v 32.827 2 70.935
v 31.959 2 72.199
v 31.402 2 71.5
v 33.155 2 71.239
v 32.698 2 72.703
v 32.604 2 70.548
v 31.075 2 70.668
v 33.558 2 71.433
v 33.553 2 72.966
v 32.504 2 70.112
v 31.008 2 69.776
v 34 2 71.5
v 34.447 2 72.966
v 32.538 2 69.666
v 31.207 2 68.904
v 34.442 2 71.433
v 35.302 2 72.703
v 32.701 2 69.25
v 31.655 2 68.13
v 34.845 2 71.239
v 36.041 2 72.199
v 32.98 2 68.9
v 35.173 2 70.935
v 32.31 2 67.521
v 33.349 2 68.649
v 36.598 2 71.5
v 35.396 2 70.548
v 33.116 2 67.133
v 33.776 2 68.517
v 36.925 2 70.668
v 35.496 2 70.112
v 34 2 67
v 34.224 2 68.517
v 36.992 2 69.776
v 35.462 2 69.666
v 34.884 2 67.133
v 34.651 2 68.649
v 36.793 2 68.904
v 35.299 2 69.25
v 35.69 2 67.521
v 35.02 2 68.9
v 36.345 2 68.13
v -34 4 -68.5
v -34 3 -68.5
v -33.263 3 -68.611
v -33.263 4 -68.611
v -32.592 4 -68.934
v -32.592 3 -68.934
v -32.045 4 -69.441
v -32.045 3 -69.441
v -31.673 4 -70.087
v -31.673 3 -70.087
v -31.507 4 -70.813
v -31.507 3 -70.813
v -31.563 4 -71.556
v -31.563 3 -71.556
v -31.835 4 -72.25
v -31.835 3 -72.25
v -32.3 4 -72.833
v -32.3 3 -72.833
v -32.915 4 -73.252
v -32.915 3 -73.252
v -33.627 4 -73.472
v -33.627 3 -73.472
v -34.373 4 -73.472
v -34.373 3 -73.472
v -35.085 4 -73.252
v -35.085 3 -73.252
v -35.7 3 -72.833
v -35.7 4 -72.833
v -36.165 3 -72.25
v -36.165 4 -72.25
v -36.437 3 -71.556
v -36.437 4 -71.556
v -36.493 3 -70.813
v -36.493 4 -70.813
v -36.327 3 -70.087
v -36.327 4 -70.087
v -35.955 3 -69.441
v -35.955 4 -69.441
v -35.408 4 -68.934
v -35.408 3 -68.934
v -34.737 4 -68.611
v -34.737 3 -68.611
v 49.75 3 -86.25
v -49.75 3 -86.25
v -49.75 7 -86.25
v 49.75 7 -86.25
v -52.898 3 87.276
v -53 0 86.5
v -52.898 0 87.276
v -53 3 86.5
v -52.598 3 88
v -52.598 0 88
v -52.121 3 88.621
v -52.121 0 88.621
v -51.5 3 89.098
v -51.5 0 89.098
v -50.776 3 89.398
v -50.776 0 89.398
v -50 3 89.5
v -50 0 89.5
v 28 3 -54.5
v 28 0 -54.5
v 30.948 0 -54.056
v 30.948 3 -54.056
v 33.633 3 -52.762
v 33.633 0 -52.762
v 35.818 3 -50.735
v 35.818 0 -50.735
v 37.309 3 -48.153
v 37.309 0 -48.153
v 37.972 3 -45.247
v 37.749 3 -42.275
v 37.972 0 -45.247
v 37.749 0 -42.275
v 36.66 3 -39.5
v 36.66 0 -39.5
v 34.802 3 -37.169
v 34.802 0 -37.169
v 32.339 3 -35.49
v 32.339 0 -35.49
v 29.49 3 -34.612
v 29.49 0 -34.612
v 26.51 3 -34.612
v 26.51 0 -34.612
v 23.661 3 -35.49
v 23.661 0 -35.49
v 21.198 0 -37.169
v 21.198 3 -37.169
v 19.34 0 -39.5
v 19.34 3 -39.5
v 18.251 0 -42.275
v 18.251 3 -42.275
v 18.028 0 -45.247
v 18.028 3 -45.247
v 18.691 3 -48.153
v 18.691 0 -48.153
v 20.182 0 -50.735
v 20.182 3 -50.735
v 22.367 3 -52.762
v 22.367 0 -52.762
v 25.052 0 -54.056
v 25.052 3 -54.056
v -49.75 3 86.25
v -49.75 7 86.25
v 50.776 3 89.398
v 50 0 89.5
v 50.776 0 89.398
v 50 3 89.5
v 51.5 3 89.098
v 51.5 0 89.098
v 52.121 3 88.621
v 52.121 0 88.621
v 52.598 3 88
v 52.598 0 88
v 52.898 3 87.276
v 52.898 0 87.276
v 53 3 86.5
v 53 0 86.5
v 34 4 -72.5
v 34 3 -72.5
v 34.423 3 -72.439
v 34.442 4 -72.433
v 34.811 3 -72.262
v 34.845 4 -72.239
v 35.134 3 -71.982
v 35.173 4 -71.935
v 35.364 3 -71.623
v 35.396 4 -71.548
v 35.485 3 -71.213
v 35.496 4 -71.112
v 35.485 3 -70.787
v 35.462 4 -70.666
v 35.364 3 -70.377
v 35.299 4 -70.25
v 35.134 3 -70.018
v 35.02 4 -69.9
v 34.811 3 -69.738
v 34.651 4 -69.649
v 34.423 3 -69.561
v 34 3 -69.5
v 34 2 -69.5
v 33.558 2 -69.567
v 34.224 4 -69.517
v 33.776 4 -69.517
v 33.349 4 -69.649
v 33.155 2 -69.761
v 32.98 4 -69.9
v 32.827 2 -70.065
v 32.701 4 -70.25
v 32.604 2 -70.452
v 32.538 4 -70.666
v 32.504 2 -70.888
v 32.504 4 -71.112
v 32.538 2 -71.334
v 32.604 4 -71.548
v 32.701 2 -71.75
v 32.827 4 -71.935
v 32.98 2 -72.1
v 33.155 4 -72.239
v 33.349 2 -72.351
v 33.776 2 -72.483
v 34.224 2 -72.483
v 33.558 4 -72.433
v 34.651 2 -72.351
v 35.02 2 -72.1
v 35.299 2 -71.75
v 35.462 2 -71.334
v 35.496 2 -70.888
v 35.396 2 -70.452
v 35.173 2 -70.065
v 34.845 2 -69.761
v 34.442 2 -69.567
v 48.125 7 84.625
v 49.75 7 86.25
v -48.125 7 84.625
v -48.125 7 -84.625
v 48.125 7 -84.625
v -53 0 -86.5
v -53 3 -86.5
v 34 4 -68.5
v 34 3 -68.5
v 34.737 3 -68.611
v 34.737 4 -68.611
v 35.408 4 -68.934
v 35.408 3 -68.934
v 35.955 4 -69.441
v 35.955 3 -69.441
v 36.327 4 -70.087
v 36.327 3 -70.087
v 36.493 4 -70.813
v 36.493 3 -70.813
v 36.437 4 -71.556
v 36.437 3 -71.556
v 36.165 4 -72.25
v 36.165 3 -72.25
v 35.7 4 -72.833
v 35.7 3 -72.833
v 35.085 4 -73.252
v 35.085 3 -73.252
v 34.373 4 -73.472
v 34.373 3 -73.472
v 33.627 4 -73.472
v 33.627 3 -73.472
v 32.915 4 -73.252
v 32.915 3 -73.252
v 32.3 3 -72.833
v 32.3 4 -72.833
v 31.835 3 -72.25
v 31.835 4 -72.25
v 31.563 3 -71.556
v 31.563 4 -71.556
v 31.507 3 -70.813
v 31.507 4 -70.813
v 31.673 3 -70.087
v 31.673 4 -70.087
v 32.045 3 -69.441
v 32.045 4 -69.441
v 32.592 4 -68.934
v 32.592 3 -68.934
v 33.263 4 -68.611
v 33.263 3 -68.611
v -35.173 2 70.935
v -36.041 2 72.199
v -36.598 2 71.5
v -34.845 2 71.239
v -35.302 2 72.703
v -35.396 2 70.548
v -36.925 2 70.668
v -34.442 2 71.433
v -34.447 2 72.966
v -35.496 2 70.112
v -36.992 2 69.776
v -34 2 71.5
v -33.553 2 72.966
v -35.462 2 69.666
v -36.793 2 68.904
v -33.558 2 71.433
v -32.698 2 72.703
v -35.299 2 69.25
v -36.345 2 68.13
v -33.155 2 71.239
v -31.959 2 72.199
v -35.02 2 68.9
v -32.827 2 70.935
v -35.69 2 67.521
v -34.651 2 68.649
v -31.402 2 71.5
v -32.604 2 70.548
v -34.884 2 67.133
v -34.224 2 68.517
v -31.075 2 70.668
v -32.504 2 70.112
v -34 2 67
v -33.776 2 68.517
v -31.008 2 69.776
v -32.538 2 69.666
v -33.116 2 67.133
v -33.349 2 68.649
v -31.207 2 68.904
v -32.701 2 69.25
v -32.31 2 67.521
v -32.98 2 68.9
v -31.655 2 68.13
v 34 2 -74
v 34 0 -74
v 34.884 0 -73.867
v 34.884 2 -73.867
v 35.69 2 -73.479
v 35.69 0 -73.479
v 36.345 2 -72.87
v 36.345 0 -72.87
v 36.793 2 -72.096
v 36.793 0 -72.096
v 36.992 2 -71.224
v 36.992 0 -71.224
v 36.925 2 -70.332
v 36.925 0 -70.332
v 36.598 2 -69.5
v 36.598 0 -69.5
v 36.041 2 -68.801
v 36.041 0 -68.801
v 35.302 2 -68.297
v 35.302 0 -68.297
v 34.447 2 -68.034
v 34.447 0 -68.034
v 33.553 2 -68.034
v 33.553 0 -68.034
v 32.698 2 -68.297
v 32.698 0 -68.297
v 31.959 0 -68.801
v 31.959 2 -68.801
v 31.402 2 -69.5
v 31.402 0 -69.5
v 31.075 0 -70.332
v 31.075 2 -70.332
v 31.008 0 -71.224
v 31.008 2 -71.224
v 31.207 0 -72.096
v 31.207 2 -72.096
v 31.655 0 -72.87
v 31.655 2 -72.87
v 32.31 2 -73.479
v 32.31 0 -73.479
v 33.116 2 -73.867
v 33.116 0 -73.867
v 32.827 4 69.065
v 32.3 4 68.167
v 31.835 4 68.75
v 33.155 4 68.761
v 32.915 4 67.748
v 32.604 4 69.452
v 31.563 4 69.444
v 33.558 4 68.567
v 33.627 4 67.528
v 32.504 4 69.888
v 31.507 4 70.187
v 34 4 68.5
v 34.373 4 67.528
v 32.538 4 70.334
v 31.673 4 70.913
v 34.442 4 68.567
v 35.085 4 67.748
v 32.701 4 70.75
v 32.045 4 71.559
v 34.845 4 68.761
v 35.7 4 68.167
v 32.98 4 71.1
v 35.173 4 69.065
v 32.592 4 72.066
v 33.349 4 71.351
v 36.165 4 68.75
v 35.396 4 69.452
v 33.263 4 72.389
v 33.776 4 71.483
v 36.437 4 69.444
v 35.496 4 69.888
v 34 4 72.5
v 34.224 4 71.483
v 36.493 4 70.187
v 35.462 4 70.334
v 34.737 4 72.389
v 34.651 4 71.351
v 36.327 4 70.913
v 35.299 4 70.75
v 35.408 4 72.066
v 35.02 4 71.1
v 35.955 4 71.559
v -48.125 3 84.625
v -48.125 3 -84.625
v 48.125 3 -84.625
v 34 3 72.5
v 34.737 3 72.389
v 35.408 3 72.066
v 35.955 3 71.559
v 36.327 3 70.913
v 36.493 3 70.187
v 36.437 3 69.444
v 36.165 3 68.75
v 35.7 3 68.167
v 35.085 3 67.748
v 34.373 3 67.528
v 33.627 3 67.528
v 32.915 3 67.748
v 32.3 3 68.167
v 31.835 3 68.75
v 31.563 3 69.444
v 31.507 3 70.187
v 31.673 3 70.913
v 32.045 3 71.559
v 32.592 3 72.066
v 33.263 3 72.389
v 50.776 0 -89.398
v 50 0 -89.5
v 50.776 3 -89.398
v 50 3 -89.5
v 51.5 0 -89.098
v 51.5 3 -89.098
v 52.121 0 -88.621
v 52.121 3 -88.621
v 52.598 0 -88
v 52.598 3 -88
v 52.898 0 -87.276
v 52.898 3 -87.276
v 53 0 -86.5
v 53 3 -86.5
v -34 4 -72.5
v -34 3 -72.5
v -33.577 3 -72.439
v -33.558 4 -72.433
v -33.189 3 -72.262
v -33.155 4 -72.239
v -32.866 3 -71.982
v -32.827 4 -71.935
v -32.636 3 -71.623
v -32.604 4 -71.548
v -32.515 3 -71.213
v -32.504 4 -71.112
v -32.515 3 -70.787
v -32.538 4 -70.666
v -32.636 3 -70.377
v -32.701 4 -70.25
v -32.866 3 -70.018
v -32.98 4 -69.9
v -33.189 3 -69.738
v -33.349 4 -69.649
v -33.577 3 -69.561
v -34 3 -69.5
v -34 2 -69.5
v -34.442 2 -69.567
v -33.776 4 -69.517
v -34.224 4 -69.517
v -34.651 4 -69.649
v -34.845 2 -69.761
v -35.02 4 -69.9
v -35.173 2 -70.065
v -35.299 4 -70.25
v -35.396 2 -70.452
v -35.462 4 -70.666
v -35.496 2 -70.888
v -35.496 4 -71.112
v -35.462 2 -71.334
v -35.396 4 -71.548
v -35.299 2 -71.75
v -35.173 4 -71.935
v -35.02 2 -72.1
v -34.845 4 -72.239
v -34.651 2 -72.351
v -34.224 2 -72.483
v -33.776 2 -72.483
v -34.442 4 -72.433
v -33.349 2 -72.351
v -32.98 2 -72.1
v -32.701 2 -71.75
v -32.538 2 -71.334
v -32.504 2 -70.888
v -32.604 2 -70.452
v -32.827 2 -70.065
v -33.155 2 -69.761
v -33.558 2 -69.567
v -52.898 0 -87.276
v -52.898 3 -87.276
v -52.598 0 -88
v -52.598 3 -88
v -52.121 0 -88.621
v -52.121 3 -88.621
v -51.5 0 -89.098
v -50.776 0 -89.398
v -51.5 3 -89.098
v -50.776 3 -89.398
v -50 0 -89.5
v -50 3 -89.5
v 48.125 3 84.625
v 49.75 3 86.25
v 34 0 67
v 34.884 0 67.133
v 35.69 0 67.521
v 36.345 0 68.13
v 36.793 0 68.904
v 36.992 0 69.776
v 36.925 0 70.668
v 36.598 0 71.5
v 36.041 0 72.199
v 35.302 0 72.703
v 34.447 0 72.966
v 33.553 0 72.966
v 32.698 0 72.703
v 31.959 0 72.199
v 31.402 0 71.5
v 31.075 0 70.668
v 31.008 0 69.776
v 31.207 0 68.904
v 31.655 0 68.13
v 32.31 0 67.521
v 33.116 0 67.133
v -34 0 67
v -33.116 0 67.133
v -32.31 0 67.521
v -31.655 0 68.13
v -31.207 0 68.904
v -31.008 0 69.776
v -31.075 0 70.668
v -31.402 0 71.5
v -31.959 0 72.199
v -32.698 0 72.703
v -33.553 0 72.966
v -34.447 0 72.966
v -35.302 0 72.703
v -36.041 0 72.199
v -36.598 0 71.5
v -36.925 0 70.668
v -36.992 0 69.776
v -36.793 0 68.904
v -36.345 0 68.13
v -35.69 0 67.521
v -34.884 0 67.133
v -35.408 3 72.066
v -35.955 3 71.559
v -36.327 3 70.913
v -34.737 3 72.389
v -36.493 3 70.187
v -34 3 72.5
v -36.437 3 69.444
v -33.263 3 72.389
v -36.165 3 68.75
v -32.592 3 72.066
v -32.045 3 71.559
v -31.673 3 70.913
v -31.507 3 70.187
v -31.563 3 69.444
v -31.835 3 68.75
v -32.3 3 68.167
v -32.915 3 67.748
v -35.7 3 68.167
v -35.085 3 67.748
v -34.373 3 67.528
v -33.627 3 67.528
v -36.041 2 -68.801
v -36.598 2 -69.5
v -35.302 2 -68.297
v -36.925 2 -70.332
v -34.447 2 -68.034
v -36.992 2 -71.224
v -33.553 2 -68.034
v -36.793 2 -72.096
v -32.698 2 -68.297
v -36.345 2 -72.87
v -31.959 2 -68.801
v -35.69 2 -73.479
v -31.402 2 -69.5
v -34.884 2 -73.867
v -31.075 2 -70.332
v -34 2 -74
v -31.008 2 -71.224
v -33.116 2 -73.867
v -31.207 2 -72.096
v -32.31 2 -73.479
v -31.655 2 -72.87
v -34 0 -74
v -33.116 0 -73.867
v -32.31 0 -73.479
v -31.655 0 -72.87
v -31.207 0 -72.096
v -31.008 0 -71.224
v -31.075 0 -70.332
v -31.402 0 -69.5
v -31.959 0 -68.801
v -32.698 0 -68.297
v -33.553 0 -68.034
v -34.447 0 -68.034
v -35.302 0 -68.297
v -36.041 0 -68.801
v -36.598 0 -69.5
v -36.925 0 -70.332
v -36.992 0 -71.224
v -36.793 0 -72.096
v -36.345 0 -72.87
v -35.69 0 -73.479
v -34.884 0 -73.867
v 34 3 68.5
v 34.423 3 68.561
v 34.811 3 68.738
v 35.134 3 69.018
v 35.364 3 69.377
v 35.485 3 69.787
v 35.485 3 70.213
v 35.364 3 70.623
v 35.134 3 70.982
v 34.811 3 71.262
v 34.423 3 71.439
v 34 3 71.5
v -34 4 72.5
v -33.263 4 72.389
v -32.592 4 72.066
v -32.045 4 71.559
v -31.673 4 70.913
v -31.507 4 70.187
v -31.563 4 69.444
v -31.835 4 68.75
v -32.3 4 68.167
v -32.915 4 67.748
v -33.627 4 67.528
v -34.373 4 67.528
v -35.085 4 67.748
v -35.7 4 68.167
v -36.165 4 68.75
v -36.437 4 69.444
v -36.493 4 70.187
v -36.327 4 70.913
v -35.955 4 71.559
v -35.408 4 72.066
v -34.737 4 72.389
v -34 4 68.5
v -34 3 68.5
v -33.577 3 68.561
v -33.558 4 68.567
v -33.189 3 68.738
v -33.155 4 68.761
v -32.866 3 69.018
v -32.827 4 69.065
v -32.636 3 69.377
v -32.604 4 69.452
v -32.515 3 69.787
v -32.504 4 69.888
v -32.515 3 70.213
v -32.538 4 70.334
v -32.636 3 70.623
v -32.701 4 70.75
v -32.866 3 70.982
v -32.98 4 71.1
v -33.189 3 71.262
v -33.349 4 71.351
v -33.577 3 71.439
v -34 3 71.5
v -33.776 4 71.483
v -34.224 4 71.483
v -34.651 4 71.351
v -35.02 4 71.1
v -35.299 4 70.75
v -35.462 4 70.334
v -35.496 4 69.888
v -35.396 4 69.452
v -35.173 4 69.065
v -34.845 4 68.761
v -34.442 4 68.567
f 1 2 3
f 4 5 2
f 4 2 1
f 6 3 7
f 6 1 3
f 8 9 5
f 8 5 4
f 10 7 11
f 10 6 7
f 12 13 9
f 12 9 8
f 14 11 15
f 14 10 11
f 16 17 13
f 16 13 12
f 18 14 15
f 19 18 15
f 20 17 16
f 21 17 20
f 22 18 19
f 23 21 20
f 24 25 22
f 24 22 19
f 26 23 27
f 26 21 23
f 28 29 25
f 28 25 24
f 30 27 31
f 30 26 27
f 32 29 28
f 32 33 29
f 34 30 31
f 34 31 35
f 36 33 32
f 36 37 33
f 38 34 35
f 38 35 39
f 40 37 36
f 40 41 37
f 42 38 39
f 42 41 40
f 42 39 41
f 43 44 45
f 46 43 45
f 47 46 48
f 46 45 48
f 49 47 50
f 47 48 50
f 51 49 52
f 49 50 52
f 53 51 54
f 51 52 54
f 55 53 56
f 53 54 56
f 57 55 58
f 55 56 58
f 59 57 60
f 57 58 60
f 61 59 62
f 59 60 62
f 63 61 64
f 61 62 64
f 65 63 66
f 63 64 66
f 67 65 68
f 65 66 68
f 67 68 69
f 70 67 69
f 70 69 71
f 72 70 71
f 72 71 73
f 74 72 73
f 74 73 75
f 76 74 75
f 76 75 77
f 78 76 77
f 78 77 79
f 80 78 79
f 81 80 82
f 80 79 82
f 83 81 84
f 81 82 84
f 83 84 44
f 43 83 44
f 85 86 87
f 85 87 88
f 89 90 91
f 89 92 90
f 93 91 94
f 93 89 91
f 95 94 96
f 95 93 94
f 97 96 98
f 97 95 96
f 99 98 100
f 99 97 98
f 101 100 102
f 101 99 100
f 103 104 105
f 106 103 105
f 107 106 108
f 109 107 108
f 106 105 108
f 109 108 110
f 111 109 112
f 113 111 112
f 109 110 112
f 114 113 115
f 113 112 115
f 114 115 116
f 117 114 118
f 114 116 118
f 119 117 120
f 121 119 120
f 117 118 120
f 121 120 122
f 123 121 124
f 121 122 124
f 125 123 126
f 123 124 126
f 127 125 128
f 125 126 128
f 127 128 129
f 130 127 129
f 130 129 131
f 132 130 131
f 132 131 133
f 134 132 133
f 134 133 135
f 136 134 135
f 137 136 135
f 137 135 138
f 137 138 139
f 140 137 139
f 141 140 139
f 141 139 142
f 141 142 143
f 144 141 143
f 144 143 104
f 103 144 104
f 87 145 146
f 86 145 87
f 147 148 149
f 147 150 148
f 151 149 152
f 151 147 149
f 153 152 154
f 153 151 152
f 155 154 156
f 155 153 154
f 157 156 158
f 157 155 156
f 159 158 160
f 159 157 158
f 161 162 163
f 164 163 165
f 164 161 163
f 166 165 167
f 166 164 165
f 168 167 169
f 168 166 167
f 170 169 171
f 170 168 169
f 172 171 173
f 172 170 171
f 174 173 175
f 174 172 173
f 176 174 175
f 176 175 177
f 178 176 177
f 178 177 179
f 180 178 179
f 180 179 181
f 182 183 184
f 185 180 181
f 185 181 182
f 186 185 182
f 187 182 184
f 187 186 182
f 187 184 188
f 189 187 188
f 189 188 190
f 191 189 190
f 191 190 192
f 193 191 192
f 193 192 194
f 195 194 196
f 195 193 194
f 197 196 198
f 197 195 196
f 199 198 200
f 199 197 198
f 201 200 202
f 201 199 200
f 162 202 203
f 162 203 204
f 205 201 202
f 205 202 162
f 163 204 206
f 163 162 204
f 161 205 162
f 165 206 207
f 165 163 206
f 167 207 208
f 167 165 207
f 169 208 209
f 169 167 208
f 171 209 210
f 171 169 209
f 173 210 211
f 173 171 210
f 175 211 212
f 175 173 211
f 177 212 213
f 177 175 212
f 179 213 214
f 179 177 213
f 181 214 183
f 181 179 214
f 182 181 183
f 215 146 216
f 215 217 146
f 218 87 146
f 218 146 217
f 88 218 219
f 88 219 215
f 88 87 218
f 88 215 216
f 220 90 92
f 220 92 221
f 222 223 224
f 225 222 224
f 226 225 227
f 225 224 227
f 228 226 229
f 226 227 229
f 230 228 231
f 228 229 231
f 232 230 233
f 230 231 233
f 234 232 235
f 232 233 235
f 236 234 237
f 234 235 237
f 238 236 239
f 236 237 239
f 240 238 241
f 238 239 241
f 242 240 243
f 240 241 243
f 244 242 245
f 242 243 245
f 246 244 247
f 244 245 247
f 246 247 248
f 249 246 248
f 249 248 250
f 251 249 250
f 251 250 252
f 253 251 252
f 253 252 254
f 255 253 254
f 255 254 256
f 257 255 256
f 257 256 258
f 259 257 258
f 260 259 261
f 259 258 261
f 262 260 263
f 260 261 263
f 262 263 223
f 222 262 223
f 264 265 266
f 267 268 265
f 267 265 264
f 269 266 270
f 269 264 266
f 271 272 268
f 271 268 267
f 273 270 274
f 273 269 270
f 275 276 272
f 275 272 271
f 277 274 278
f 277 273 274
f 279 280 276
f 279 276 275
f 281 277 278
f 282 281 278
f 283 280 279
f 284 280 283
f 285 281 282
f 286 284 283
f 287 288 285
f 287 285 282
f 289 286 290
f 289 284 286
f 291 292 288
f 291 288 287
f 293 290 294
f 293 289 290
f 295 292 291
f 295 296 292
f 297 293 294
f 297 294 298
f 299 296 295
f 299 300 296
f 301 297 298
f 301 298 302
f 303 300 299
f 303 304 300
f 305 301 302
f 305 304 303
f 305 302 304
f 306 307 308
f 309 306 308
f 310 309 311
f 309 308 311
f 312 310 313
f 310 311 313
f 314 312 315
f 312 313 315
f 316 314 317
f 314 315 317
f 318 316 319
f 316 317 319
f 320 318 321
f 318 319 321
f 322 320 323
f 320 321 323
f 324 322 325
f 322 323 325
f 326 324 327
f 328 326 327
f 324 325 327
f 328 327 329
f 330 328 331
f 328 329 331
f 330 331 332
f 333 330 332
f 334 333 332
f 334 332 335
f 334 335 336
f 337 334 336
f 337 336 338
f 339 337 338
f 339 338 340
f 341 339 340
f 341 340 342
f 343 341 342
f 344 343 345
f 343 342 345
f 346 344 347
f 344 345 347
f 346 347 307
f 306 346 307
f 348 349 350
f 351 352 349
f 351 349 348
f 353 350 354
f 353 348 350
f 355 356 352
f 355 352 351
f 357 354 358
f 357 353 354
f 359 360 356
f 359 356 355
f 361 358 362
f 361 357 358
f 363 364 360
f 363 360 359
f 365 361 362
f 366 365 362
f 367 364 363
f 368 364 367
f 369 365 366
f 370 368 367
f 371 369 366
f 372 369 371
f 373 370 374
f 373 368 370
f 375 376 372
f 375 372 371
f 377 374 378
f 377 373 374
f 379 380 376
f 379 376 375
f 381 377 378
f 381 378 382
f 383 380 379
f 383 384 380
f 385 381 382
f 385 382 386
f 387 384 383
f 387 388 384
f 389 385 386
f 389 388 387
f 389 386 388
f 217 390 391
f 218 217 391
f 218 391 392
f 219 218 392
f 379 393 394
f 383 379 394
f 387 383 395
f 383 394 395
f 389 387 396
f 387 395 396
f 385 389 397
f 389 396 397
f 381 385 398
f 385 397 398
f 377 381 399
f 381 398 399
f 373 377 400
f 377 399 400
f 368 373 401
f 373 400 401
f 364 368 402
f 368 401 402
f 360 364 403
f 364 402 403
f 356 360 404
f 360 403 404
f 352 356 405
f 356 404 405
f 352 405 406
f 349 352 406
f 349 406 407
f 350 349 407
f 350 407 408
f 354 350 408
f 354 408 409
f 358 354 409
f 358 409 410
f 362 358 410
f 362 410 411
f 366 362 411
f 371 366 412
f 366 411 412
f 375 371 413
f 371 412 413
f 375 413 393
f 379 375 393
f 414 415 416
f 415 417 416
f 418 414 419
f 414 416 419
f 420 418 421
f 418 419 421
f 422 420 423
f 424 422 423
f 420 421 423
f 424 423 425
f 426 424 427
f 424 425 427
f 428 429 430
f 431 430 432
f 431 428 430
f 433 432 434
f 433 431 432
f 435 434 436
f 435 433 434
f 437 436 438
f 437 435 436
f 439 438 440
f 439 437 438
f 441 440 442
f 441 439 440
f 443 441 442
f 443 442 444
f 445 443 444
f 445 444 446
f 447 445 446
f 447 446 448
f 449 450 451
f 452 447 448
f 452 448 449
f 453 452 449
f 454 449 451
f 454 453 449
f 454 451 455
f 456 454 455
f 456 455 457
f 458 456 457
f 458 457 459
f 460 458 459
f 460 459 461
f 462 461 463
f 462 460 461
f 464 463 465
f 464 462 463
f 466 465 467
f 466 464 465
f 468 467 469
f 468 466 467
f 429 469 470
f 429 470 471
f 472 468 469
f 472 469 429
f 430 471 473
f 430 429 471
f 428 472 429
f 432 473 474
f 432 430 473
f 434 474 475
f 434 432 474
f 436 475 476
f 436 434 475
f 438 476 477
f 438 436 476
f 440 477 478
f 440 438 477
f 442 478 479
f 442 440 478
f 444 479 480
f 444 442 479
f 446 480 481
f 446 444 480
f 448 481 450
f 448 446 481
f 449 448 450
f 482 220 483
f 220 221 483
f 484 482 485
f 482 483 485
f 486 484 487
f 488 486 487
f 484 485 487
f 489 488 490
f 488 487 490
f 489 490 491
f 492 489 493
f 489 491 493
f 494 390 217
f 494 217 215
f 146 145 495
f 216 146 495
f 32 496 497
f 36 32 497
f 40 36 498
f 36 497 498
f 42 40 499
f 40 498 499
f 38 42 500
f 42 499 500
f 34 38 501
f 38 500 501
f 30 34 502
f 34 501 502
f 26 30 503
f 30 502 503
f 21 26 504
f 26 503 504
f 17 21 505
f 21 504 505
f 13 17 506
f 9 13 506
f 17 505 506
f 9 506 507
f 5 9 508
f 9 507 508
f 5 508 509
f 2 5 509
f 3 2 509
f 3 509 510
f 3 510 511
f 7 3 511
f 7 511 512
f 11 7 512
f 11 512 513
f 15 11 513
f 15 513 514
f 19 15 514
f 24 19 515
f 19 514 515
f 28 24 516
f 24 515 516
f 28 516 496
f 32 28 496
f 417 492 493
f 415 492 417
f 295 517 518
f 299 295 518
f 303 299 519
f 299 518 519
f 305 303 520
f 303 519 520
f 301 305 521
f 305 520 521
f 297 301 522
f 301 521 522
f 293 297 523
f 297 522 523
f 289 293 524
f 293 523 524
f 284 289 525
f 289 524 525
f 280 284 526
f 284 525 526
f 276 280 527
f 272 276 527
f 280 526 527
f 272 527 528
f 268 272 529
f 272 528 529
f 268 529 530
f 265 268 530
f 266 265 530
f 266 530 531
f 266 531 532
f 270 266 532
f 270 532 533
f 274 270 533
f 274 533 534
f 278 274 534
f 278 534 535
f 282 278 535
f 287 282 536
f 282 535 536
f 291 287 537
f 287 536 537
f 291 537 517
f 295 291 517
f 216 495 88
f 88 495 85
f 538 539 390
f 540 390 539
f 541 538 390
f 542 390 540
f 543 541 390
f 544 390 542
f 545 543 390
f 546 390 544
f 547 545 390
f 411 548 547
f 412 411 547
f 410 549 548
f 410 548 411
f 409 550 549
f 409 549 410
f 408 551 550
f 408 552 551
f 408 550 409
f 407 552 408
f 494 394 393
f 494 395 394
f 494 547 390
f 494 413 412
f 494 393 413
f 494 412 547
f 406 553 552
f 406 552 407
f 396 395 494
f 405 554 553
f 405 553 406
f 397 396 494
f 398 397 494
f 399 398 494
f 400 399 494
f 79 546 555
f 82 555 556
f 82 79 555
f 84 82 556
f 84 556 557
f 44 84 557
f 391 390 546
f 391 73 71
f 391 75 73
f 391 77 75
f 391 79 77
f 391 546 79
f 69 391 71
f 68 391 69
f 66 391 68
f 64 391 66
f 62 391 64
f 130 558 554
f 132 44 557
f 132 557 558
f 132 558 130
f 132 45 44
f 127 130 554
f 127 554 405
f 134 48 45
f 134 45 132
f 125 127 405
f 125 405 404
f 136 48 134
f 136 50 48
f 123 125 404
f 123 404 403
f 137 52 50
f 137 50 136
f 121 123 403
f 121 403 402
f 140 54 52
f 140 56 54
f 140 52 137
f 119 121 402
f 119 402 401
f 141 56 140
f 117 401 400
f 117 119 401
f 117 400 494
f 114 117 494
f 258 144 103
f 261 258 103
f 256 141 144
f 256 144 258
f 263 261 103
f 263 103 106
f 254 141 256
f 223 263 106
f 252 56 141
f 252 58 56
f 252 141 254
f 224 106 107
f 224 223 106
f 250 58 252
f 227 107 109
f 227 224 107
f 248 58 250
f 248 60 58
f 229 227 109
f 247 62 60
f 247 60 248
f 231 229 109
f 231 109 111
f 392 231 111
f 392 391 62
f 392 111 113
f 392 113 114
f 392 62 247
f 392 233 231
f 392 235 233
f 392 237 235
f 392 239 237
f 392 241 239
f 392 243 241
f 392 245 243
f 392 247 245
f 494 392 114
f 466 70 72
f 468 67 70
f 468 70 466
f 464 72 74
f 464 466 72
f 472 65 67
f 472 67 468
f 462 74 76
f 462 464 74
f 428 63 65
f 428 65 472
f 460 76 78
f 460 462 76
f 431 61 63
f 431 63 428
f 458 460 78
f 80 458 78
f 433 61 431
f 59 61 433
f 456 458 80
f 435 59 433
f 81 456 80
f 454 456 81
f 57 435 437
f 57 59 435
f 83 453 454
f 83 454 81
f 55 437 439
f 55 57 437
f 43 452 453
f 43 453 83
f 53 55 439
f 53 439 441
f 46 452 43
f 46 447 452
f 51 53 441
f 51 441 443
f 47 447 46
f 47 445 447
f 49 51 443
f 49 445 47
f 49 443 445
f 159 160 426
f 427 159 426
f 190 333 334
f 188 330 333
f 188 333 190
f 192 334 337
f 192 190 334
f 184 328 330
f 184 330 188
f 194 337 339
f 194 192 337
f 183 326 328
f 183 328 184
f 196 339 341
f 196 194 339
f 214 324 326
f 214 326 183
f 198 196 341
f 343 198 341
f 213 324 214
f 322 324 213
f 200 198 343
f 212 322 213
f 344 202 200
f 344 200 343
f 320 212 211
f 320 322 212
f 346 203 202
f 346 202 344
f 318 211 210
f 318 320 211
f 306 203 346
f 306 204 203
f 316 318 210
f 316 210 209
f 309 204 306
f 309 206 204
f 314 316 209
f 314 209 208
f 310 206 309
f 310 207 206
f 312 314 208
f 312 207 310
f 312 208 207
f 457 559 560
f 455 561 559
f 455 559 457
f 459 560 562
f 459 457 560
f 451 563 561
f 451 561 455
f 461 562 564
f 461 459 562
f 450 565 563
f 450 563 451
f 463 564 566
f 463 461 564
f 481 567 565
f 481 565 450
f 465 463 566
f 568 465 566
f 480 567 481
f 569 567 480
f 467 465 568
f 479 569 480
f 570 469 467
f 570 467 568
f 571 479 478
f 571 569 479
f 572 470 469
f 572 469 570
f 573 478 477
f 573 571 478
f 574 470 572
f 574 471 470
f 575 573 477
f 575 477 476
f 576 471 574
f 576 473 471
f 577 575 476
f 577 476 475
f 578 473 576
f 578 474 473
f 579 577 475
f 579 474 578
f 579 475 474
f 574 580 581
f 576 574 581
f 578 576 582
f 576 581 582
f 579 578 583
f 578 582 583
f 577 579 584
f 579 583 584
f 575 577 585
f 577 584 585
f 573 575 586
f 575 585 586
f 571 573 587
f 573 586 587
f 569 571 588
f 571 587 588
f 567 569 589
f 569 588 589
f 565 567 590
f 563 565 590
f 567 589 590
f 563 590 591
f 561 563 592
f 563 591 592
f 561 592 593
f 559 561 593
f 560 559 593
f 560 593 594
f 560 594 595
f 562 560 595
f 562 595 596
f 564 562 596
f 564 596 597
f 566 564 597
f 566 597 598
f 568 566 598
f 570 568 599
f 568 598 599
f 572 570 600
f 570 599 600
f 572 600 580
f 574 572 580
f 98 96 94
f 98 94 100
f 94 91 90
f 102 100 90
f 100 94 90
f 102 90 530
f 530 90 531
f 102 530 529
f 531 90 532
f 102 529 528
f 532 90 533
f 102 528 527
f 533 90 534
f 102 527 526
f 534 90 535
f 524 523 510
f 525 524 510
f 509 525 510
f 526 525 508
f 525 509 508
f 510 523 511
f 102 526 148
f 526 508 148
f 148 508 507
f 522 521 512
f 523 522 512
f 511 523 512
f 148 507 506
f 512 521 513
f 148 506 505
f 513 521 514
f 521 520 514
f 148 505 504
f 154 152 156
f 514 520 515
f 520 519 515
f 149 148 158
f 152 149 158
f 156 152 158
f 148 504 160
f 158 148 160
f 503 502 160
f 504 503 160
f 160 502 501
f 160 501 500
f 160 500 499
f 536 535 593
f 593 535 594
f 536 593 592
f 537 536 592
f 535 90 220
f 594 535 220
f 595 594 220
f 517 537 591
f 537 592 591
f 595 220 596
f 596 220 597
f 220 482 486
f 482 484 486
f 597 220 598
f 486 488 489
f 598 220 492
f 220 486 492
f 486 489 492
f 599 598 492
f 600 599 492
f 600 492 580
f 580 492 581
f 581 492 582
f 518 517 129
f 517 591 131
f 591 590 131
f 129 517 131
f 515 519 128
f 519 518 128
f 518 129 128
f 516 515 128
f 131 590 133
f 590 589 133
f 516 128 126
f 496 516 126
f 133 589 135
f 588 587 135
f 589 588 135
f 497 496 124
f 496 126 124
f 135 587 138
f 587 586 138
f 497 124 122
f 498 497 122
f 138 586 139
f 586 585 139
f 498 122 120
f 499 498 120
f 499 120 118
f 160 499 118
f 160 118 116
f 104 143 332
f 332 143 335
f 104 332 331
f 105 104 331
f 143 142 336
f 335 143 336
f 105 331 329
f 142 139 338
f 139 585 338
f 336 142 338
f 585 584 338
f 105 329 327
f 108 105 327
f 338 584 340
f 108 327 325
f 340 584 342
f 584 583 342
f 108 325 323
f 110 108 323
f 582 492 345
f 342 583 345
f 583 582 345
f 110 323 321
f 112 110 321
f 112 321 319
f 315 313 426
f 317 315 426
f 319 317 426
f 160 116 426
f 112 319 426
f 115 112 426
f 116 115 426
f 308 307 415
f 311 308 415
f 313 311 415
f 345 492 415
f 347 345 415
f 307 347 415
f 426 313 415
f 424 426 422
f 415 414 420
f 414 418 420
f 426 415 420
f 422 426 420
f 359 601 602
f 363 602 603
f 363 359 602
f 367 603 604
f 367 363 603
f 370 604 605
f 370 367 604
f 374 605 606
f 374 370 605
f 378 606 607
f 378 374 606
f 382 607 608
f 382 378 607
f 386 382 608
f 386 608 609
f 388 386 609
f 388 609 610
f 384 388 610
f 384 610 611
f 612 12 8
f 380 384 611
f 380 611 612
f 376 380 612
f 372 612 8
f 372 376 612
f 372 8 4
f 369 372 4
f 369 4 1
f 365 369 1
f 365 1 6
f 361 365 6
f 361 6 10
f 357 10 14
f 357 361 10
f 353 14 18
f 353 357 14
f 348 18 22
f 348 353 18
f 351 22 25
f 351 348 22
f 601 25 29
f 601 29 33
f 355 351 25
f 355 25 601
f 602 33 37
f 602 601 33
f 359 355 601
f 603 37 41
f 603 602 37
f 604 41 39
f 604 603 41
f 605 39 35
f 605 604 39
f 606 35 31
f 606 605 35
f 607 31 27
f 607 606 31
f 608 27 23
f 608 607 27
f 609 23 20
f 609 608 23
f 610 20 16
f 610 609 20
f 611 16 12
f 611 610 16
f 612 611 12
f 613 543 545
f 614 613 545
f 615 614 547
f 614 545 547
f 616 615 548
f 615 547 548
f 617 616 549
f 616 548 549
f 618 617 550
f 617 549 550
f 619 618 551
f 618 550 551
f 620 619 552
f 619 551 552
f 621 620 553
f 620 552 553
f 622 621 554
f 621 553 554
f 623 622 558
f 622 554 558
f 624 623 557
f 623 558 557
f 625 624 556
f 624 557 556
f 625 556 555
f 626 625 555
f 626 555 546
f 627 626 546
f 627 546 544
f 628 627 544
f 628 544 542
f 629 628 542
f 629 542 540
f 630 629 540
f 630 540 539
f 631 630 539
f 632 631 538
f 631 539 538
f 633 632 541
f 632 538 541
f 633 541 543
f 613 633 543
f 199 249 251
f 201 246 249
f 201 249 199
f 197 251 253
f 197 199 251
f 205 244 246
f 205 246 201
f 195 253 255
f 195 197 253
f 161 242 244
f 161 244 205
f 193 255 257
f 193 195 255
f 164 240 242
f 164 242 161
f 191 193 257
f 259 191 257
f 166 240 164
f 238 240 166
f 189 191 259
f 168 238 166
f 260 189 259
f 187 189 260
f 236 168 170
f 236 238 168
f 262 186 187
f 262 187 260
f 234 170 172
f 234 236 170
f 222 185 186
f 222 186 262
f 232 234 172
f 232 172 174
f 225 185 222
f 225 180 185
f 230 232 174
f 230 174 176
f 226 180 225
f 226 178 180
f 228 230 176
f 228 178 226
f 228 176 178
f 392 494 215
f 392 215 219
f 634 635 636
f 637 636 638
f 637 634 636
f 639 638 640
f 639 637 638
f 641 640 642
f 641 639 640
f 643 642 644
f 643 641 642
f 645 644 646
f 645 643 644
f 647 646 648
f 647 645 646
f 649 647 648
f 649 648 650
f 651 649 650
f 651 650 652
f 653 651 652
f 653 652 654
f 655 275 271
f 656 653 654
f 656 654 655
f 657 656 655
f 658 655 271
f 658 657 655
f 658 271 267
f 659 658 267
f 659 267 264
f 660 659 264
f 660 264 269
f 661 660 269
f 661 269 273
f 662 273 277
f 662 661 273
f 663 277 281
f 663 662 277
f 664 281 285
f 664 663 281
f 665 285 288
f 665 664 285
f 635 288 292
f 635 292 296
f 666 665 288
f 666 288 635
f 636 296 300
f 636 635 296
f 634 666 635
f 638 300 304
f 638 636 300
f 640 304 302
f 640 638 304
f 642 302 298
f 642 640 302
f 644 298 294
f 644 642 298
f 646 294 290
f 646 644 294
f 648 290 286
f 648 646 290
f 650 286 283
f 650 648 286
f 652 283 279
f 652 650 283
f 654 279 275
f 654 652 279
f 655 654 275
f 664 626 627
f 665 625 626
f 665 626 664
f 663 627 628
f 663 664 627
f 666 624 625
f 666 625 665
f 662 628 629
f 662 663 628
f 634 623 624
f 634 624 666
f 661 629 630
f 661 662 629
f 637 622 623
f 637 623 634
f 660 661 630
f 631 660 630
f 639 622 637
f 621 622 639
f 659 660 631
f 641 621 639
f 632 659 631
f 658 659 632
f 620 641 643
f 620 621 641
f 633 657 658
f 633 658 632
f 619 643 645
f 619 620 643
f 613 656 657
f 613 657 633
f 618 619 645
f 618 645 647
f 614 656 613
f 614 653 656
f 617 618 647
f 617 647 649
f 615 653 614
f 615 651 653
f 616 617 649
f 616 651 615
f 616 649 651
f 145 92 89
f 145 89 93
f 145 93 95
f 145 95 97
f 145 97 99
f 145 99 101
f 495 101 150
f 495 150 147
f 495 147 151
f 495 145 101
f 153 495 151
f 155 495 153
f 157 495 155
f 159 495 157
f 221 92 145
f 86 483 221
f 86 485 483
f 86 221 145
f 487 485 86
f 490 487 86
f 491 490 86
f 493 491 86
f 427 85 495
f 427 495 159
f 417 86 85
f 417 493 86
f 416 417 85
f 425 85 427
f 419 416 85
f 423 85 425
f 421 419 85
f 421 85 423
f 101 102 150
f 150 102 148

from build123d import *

# Parameters (mm, degrees)
CROQUIS3_W                 = 106
CROQUIS3_H                 = 179
SALIENTE_EXTRUIR4_DEPTH    = 3
CROQUIS3_6_W               = 99.5
CROQUIS3_6_H               = 172.5
CROQUIS3_6_W_2             = 96.25
CROQUIS3_6_H_2             = 169.25
SALIENTE_EXTRUIR5_DEPTH    = 7
CROQUIS7_R                 = 10
CORTAR_EXTRUIR1_DEPTH      = 7
REDONDEO1_R                = 3
CORTAR_EXTRUIR2_DEPTH      = 20
CORTAR_EXTRUIR2_DEPTH_BACK = 20
CROQUIS8_R                 = 1.5
CROQUIS12_R                = 3
CORTAR_EXTRUIR3_DEPTH      = 2
CROQUIS13_R                = 2.5
SALIENTE_EXTRUIR7_DEPTH    = 1
CORTAR_EXTRUIR4_DEPTH      = 1
CORTAR_EXTRUIR4_DEPTH_BACK = 11
CROQUIS14_R                = 1.5


with BuildPart() as part:
    # Croquis3 → Saliente-Extruir4 (new body)
    with BuildSketch(Plane(origin=(0, 0, 0), x_dir=(1, 0, 0), z_dir=(0, 1, 0))):
        Rectangle(CROQUIS3_W, CROQUIS3_H)
    extrude(amount=SALIENTE_EXTRUIR4_DEPTH)

    # Croquis3<6> → Saliente-Extruir5 (add)
    with BuildSketch(Plane(origin=(0, 0, 0), x_dir=(1, 0, 0), z_dir=(0, 1, 0))):
        Rectangle(CROQUIS3_6_W, CROQUIS3_6_H)
        Rectangle(CROQUIS3_6_W_2, CROQUIS3_6_H_2, mode=Mode.SUBTRACT)
    extrude(amount=SALIENTE_EXTRUIR5_DEPTH)

    # Croquis7 → Cortar-Extruir1 (cut)
    with BuildSketch(Plane.XZ):
        with Locations((28, -44.5)):
            Circle(CROQUIS7_R)
    extrude(amount=-CORTAR_EXTRUIR1_DEPTH, mode=Mode.SUBTRACT)

    # Redondeo1
    redondeo1_edges = [part.edges().sort_by_distance(p)[0] for p in [
        (53, 1.5, -89.5),
        (-53, 1.5, -89.5),
        (53, 1.5, 89.5),
        (-53, 1.5, 89.5),
    ]]
    fillet(redondeo1_edges, radius=REDONDEO1_R)

    # Croquis8 → Cortar-Extruir2 (cut, two sides: drawn at the far end of the back side and taken through both)
    with BuildSketch(Plane(origin=(0, 3, 0), x_dir=(1, 0, 0), z_dir=(0, 1, 0)).offset(-CORTAR_EXTRUIR2_DEPTH_BACK)):
        with Locations((-34, 71)):
            Circle(CROQUIS8_R)
        with Locations((34, 71)):
            Circle(CROQUIS8_R)
        with Locations((-34, -70)):
            Circle(CROQUIS8_R)
        with Locations((34, -70)):
            Circle(CROQUIS8_R)
    extrude(amount=CORTAR_EXTRUIR2_DEPTH + CORTAR_EXTRUIR2_DEPTH_BACK, mode=Mode.SUBTRACT)

    # Croquis12 → Cortar-Extruir3 (cut)
    with BuildSketch(Plane.XZ):
        with Locations((-34, 70)):
            Circle(CROQUIS12_R)
        with Locations((34, 70)):
            Circle(CROQUIS12_R)
        with Locations((34, -71)):
            Circle(CROQUIS12_R)
        with Locations((-34, -71)):
            Circle(CROQUIS12_R)
    extrude(amount=-CORTAR_EXTRUIR3_DEPTH, mode=Mode.SUBTRACT)

    # Croquis13 → Saliente-Extruir7 (add)
    with BuildSketch(Plane(origin=(0, 3, 0), x_dir=(1, 0, 0), z_dir=(0, 1, 0))):
        with Locations((-34, 71)):
            Circle(CROQUIS13_R)
        with Locations((34, 71)):
            Circle(CROQUIS13_R)
        with Locations((-34, -70)):
            Circle(CROQUIS13_R)
        with Locations((34, -70)):
            Circle(CROQUIS13_R)
    extrude(amount=SALIENTE_EXTRUIR7_DEPTH)

    # Croquis14 → Cortar-Extruir4 (cut, two sides: drawn at the far end of the back side and taken through both)
    with BuildSketch(Plane.XZ.offset(-CORTAR_EXTRUIR4_DEPTH_BACK)):
        with Locations((-34, 70)):
            Circle(CROQUIS14_R)
        with Locations((34, 70)):
            Circle(CROQUIS14_R)
        with Locations((34, -71)):
            Circle(CROQUIS14_R)
        with Locations((-34, -71)):
            Circle(CROQUIS14_R)
    extrude(amount=CORTAR_EXTRUIR4_DEPTH + CORTAR_EXTRUIR4_DEPTH_BACK, mode=Mode.SUBTRACT)


solid = part.part
